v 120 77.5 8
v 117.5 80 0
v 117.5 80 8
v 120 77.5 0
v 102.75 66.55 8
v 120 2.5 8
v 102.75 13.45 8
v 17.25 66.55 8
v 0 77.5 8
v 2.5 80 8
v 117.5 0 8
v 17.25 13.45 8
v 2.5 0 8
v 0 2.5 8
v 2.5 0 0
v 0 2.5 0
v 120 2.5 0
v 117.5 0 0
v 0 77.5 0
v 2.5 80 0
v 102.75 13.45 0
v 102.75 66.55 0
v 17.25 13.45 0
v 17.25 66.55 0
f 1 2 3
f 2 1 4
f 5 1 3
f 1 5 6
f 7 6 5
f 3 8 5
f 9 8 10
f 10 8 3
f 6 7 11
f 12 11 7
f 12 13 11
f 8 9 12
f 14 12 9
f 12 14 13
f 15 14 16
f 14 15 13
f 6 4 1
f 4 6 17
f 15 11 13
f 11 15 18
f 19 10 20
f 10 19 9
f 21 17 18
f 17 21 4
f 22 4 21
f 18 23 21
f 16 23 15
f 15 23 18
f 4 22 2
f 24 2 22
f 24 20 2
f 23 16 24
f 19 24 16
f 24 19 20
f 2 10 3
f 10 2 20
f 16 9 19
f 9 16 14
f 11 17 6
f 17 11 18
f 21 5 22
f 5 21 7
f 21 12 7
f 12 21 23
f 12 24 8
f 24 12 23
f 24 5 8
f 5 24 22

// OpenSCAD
$fn = 32;

// ----------------------------------------------------------------------
// Windowed plate: 1 voids, 120 x 80 x 8 mm
// ----------------------------------------------------------------------

// --- parameters (mm) ---
plate_l = 120;            // plate length, X
plate_w = 80;             // plate width, Y
plate_t = 8;              // plate thickness, Z
edge_margin = 10;         // wall from the plate edge to any window
win1_l = 85.5;            // window length
win1_w = 53.1;            // window width
depth_1 = 8;              // depth of void 1 (full thickness = through)
corner_c = 2.5;           // corner chamfer of the plate

profile = [[2.5, 0], [117.5, 0], [120, 2.5], [120, 77.5], [117.5, 80], [2.5, 80], [0, 77.5], [0, 2.5]];  // primary outline, 8 points, counter clockwise
void_1 = [[17.25, 13.45], [102.75, 13.45], [102.75, 66.55], [17.25, 66.55]];  // large central window, 4 points

// --- the one profile operation ---
difference() {
  linear_extrude(height = plate_t) polygon(points = profile);
  translate([0, 0, -1])
    linear_extrude(height = plate_t + 2) polygon(points = void_1);
}
